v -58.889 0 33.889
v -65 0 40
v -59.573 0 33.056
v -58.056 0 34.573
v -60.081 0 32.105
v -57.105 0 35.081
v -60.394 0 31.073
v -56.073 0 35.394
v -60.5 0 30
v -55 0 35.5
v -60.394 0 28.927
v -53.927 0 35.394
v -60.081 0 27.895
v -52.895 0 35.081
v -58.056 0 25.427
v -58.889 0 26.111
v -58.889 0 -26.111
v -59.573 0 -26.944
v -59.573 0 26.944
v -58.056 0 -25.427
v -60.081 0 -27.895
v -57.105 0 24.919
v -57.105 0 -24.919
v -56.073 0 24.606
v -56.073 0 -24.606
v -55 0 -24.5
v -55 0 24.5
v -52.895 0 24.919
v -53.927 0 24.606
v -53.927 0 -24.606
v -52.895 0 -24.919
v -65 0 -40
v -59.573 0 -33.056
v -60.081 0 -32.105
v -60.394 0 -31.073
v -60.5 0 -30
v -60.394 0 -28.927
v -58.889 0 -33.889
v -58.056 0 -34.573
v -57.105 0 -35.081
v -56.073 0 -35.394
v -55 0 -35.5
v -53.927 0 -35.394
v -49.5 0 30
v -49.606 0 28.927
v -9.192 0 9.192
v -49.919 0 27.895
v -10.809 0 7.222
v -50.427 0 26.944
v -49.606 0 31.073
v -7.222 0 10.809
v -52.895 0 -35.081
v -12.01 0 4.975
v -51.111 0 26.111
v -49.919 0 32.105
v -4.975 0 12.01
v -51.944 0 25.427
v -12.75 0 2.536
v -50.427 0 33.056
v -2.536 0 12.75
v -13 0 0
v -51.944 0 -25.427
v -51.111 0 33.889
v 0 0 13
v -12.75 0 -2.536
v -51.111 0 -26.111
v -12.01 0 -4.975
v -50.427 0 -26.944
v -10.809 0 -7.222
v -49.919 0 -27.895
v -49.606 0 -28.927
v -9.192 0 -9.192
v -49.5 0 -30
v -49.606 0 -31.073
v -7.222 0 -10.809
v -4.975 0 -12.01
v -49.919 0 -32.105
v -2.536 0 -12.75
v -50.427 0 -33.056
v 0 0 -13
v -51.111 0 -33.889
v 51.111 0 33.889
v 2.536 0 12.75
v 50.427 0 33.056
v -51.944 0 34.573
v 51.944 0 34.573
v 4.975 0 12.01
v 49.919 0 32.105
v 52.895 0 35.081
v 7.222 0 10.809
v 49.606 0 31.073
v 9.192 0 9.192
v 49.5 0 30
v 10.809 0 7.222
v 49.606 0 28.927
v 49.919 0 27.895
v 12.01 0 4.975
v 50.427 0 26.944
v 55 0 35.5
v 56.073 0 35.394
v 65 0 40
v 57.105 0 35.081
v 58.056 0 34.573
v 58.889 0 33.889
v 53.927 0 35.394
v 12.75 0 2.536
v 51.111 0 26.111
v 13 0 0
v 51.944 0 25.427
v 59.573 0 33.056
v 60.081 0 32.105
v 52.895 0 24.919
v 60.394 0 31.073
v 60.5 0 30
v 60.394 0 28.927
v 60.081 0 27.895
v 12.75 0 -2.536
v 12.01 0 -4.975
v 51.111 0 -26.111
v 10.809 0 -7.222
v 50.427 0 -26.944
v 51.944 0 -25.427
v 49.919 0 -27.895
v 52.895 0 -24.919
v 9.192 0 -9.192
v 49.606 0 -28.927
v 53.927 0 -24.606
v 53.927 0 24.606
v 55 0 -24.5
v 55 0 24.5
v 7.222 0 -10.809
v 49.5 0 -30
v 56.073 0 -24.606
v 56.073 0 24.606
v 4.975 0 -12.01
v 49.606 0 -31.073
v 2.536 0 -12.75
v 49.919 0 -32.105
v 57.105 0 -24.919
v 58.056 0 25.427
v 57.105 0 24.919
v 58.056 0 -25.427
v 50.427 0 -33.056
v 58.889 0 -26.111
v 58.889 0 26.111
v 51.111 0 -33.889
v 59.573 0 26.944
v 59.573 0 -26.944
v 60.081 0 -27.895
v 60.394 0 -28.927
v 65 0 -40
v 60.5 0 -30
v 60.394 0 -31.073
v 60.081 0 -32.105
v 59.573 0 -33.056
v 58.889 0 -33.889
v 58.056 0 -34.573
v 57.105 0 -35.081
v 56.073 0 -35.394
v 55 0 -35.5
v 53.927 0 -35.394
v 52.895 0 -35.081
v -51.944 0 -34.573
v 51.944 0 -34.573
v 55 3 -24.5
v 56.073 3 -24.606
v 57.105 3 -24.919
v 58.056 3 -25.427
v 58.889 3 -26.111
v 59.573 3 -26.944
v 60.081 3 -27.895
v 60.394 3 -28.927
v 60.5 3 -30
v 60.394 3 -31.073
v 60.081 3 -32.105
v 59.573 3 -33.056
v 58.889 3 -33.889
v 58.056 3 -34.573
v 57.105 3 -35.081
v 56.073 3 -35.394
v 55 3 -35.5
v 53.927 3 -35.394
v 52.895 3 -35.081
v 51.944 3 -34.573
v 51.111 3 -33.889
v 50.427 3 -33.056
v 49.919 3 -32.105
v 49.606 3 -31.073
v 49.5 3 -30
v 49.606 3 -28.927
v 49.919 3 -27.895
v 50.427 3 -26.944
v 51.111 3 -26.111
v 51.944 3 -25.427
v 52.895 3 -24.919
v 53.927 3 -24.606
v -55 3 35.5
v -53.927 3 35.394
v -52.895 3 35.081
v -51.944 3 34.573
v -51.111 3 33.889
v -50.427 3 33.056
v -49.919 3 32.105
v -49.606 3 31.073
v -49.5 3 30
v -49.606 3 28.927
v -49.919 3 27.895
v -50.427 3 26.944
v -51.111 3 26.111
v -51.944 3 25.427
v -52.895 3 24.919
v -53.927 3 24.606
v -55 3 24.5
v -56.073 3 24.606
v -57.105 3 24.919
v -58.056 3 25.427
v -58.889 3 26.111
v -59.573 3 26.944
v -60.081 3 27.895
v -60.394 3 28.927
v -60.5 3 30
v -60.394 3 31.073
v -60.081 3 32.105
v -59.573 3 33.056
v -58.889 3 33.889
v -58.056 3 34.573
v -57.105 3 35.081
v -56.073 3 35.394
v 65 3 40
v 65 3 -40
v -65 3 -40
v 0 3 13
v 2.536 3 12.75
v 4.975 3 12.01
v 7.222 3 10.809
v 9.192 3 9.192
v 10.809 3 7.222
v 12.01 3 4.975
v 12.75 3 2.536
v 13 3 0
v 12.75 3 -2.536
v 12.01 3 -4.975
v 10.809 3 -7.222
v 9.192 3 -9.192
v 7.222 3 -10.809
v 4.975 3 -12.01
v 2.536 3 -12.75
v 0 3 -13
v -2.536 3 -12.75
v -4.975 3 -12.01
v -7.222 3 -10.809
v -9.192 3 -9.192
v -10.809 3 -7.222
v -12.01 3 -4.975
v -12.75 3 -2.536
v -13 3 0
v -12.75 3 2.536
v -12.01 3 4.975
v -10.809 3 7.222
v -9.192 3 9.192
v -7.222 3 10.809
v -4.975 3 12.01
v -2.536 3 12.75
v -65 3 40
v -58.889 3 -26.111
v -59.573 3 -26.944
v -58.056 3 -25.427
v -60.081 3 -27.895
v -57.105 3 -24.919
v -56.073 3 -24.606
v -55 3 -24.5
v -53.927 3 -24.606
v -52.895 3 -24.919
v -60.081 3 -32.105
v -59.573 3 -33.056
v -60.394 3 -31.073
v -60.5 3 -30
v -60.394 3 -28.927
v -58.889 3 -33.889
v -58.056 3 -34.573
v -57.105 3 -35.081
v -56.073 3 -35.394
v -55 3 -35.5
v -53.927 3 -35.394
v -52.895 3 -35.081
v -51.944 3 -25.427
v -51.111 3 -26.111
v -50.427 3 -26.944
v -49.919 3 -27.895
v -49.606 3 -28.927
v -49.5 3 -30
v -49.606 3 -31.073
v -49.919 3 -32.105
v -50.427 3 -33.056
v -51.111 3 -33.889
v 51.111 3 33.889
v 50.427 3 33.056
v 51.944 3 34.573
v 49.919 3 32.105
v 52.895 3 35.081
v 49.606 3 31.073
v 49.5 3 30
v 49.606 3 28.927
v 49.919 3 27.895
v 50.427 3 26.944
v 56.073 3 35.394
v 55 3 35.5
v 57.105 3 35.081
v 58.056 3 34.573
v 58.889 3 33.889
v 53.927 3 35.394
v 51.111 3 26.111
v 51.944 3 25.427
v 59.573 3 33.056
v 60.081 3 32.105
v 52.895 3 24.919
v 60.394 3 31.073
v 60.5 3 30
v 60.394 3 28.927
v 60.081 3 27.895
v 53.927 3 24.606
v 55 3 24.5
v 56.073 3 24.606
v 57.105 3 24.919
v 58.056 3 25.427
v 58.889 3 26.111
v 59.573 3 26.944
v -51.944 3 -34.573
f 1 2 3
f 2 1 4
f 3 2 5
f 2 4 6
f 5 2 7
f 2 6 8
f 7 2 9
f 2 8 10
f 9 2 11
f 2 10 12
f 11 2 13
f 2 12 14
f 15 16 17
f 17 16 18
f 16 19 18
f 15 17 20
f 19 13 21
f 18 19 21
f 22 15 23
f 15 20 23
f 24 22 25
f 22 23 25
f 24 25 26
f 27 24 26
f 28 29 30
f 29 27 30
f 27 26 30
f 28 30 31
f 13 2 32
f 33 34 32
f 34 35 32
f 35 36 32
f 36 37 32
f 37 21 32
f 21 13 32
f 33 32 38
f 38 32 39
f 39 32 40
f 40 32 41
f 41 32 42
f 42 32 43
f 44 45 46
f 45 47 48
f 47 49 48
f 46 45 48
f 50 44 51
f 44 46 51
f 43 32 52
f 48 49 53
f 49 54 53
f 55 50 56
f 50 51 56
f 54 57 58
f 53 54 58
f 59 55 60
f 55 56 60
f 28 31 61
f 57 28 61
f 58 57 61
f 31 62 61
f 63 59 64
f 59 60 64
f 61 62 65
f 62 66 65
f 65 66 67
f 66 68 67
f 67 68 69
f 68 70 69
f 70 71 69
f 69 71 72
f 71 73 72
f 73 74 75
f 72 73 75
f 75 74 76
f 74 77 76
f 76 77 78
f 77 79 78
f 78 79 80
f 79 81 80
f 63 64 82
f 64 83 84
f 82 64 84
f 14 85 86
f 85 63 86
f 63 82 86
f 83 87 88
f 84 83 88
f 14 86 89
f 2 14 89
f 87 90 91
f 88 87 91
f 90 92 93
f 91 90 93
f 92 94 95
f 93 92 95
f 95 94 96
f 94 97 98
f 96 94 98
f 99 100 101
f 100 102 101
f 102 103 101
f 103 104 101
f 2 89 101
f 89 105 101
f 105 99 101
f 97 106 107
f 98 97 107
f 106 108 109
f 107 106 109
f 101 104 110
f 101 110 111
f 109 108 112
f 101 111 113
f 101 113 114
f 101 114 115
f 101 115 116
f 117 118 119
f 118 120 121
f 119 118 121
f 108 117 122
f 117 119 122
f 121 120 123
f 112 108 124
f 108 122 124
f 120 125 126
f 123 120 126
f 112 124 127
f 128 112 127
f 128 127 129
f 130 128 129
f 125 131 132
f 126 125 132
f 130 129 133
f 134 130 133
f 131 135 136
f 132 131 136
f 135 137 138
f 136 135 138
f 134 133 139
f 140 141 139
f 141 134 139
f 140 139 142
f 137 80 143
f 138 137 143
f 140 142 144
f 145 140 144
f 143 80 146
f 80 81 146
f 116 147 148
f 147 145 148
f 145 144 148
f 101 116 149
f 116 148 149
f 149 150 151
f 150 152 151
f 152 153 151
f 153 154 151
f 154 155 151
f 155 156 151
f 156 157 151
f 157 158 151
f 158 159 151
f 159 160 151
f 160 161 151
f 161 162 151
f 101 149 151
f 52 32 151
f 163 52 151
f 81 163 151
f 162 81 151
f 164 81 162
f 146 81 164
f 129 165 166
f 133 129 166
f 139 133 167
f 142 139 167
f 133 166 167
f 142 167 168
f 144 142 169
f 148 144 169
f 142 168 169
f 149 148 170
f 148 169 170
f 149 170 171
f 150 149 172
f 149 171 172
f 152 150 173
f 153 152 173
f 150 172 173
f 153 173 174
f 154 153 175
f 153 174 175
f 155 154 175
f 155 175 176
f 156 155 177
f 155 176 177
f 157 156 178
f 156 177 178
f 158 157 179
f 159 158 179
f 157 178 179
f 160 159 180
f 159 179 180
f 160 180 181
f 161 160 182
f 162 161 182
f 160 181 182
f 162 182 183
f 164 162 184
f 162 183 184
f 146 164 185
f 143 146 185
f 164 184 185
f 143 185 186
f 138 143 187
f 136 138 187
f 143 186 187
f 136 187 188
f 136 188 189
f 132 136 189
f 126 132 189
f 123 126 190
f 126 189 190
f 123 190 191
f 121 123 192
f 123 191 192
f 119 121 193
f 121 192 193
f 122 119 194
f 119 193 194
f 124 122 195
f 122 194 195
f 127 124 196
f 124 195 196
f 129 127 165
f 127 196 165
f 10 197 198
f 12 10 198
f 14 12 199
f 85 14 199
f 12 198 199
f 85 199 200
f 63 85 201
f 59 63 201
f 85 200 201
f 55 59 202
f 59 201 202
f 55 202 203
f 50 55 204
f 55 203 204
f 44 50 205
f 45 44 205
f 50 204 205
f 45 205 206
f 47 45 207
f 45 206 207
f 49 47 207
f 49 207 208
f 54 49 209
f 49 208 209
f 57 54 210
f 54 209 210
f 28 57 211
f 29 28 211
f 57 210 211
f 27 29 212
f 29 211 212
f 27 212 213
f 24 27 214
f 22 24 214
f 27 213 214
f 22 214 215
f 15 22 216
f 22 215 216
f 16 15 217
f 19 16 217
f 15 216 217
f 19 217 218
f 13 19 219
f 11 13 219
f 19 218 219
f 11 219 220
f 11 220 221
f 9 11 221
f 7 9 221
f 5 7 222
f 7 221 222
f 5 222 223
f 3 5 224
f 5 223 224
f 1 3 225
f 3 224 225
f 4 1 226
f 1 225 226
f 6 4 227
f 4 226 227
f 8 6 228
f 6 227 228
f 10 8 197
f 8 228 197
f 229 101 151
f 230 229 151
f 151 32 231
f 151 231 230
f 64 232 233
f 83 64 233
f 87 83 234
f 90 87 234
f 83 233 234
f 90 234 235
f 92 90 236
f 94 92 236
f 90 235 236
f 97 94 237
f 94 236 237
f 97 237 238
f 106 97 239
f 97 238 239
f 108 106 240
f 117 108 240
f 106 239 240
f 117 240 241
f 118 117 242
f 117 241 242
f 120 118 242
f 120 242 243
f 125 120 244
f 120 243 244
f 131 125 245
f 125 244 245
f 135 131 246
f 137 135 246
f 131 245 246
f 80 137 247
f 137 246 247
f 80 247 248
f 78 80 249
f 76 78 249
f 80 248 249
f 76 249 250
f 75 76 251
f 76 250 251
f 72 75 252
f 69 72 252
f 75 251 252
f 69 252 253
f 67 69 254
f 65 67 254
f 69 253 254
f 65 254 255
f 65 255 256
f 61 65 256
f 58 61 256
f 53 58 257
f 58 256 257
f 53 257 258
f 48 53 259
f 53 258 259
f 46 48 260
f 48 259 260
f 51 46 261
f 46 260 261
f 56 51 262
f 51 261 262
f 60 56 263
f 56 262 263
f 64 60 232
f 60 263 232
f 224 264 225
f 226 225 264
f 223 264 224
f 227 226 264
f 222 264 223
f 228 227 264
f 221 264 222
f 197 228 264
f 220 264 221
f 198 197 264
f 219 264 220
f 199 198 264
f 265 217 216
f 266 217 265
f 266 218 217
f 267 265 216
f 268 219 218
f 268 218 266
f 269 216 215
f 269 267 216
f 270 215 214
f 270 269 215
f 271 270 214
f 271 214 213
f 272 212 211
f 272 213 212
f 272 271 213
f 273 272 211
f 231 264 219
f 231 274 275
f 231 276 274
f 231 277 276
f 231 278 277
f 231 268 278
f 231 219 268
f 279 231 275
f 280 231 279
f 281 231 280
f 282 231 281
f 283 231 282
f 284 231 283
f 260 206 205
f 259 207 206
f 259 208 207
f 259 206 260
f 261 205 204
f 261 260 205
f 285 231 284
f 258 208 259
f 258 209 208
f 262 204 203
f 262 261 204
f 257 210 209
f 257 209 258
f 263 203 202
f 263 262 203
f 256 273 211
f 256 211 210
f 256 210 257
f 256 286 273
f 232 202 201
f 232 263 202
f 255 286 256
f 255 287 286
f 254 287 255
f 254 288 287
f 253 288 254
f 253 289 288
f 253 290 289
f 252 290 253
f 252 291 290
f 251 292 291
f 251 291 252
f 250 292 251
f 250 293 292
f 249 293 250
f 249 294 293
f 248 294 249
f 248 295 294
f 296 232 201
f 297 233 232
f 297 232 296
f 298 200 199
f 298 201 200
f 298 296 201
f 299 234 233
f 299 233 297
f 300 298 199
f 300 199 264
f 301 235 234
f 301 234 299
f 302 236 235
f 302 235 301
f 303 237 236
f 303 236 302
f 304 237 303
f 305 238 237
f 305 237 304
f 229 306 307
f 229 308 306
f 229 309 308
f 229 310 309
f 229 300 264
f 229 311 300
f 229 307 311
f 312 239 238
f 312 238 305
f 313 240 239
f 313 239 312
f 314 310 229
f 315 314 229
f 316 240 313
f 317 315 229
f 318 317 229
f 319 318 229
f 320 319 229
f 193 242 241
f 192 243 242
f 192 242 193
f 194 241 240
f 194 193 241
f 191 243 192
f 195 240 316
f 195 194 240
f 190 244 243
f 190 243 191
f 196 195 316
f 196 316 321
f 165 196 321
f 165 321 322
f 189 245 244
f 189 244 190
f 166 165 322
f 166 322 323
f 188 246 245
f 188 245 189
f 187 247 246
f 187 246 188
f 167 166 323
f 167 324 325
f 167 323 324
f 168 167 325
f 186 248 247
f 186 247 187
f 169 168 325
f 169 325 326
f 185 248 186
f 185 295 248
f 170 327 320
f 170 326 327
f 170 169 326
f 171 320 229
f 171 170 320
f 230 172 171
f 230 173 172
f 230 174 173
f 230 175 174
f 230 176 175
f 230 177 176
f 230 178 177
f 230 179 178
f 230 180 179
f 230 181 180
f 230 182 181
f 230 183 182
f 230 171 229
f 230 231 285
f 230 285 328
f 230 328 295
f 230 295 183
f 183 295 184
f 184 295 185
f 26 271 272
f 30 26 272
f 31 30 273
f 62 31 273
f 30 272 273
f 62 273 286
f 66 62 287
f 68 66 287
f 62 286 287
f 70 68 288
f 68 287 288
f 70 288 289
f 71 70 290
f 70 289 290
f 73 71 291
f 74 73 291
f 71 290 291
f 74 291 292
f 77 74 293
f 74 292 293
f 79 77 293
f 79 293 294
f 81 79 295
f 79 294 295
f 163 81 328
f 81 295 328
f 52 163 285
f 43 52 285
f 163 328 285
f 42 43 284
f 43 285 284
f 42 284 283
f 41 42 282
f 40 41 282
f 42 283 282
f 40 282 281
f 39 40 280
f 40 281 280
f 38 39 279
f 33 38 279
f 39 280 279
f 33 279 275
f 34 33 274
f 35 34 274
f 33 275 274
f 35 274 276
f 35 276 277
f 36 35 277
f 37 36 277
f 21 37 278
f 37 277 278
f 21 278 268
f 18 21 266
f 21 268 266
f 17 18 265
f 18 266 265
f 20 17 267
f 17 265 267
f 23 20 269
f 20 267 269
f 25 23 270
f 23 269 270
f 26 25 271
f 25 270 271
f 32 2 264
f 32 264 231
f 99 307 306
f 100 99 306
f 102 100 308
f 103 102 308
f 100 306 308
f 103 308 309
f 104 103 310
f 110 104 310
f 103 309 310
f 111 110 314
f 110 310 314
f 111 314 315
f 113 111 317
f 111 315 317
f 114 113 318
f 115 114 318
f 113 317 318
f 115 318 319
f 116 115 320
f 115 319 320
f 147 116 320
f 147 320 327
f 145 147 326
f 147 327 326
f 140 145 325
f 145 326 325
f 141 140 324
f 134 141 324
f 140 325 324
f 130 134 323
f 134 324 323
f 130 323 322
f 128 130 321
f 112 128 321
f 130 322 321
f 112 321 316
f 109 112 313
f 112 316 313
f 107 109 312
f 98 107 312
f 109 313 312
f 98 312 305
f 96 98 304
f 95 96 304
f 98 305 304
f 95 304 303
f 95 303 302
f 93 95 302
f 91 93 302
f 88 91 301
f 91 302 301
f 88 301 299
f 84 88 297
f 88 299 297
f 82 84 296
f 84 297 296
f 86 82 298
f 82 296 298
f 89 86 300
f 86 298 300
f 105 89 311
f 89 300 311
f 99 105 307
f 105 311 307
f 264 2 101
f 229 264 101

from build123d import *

# Parameters (mm, degrees)
CROQUIS1_W              = 130
CROQUIS1_H              = 80
SALIENTE_EXTRUIR1_DEPTH = 3
CROQUIS2_R              = 13
CORTAR_EXTRUIR1_DEPTH   = 3
CROQUIS3_R              = 5.5
CORTAR_EXTRUIR2_DEPTH   = 3


with BuildPart() as part:
    # Croquis1 → Saliente-Extruir1 (new body)
    with BuildSketch(Plane(origin=(0, 0, 0), x_dir=(1, 0, 0), z_dir=(0, 1, 0))):
        Rectangle(CROQUIS1_W, CROQUIS1_H)
    extrude(amount=SALIENTE_EXTRUIR1_DEPTH)

    # Croquis2 → Cortar-Extruir1 (cut)
    with BuildSketch(Plane(origin=(0, 3, 0), x_dir=(1, 0, 0), z_dir=(0, 1, 0))):
        with Locations(Location((0, 0, 0), (0, 0, 270))):
            Circle(CROQUIS2_R)
    extrude(amount=-CORTAR_EXTRUIR1_DEPTH, mode=Mode.SUBTRACT)

    # Croquis3 → Cortar-Extruir2 (cut)
    with BuildSketch(Plane(origin=(0, 3, 0), x_dir=(1, 0, 0), z_dir=(0, 1, 0))):
        with Locations(Location((-55, 30, 0), (0, 0, 270))):
            Circle(CROQUIS3_R)
        with Locations(Location((-55, -30, 0), (0, 0, 270))):
            Circle(CROQUIS3_R)
        with Locations(Location((55, 30, 0), (0, 0, 270))):
            Circle(CROQUIS3_R)
        with Locations(Location((55, -30, 0), (0, 0, 270))):
            Circle(CROQUIS3_R)
    extrude(amount=-CORTAR_EXTRUIR2_DEPTH, mode=Mode.SUBTRACT)


solid = part.part
